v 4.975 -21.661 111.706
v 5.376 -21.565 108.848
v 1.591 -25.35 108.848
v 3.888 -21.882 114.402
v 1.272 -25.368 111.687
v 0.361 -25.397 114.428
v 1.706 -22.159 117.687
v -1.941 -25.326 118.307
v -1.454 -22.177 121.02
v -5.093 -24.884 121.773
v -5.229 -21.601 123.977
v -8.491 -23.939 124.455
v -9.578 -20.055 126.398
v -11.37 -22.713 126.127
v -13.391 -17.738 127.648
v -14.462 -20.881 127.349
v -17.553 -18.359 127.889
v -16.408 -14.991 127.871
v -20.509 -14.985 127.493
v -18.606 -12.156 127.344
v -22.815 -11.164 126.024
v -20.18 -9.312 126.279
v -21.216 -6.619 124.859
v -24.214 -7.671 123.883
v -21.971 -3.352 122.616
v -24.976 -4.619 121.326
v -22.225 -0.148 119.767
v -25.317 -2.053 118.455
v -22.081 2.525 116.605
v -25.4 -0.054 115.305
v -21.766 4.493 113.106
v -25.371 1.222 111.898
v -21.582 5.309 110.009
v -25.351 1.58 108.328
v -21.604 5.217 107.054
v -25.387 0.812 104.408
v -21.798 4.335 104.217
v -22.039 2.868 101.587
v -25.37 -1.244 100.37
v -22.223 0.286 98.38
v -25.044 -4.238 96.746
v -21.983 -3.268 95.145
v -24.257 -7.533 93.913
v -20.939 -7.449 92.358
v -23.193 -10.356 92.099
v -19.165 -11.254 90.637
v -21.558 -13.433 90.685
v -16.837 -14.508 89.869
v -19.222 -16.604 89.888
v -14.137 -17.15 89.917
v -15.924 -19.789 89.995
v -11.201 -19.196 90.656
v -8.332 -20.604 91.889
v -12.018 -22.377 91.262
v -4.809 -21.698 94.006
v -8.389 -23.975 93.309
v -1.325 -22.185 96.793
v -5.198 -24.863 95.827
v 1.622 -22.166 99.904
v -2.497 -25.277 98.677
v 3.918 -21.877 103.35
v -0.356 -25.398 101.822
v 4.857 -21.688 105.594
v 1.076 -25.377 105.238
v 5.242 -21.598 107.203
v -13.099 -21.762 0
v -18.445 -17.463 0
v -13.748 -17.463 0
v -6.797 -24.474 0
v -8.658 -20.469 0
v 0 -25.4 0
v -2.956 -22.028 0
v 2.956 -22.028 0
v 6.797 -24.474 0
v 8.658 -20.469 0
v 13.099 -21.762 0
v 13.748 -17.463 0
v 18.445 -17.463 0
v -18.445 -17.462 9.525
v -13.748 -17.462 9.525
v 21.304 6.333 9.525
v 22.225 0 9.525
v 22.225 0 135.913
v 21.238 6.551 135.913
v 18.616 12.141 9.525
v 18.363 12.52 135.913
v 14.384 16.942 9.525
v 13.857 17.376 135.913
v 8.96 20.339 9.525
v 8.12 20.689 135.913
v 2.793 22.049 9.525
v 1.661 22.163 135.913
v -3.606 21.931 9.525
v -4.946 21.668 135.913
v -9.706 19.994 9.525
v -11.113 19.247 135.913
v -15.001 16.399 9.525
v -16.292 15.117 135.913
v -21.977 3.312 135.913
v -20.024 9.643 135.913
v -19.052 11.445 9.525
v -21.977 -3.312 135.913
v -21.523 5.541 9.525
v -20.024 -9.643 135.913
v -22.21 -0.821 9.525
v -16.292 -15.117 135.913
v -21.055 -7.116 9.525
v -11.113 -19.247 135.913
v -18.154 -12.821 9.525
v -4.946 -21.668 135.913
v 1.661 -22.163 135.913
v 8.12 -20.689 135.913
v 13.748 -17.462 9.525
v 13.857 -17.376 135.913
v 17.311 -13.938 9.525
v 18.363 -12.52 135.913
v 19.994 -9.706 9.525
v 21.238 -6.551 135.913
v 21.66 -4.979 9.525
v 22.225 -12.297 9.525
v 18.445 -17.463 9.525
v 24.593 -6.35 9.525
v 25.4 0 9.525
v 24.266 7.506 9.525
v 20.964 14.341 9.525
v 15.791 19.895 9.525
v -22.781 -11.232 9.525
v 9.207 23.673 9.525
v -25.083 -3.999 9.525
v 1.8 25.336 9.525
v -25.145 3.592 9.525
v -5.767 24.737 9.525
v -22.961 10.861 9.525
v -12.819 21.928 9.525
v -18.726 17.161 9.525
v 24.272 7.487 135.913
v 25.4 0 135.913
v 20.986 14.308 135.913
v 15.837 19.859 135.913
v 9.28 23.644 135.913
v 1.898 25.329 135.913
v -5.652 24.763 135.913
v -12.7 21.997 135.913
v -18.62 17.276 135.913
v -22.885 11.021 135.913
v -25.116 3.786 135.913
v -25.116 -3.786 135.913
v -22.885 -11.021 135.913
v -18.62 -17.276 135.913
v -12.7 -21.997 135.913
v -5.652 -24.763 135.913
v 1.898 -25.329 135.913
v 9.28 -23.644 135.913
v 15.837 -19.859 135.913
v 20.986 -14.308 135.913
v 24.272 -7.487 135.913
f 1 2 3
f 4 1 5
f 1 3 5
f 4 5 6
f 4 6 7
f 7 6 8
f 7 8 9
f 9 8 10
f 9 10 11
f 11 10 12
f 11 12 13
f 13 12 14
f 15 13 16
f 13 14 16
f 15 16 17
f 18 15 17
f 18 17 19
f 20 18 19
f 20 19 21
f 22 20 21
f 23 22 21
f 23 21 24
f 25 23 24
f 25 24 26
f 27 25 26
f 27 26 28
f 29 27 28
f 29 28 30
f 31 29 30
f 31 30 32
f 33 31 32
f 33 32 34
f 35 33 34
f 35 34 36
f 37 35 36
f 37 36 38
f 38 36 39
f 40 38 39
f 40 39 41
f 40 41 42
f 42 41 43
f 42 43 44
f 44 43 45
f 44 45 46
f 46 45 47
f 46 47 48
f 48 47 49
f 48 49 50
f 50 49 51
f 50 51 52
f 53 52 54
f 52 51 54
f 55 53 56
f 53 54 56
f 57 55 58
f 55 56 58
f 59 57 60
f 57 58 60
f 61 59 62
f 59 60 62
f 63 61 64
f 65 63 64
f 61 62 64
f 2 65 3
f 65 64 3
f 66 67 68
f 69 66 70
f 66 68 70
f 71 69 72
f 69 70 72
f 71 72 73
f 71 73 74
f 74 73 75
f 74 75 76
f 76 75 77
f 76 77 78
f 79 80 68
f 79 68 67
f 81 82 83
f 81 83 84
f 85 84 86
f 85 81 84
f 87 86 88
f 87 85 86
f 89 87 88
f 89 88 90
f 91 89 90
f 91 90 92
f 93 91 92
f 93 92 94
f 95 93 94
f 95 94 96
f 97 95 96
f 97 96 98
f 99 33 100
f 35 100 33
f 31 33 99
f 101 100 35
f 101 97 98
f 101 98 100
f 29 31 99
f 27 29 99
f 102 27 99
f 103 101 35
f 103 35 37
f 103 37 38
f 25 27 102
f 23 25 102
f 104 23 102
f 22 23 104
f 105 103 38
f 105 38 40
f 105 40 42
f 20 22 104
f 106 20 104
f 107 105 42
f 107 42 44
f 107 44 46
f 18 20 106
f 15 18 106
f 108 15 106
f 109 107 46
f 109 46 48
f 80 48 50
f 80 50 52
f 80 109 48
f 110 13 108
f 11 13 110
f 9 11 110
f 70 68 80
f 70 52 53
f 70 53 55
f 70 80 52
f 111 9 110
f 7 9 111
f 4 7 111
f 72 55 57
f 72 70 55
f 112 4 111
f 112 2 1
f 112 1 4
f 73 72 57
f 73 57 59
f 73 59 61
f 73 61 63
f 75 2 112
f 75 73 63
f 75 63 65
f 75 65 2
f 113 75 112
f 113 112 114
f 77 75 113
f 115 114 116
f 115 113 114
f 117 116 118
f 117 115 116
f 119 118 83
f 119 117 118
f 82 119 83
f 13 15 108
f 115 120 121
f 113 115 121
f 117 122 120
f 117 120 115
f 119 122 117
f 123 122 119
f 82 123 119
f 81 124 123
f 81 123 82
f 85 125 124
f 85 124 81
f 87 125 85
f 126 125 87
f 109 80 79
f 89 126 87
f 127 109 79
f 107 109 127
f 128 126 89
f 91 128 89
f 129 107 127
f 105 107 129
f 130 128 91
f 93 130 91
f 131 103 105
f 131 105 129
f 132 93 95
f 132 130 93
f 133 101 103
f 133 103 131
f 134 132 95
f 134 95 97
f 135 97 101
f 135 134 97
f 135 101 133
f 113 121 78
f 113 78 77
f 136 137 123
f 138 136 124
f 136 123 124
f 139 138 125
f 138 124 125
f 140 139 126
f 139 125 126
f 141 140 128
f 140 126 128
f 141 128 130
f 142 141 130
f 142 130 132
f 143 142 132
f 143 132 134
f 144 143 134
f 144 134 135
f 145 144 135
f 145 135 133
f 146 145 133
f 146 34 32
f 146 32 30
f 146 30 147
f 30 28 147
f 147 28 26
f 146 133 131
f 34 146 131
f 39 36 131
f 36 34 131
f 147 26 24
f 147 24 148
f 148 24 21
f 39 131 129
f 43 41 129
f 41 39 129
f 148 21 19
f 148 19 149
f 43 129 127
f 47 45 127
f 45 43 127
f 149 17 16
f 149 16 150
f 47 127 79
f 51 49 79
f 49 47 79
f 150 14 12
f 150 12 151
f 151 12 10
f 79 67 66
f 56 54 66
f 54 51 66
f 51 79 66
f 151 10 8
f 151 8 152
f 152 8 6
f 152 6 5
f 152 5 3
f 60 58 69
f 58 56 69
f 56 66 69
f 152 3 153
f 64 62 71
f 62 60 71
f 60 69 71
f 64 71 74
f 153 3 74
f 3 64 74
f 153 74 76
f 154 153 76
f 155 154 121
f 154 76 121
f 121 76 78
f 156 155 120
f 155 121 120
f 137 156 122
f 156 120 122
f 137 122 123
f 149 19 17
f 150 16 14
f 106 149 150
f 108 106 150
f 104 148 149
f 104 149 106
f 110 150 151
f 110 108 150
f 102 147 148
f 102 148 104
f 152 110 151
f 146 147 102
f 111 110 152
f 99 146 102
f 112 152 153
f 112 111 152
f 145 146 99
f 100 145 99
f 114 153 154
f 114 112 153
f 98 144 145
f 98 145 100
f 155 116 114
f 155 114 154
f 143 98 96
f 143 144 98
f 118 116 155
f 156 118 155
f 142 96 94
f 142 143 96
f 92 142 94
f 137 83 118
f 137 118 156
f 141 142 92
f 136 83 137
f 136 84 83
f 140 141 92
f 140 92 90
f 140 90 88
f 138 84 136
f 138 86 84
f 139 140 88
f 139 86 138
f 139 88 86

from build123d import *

# Parameters (mm, degrees)
SKETCH1_R               = 25.4
SKETCH1_R_2             = 22.225
BOSS_EXTRUDE1_DEPTH     = 914.4
CUT_EXTRUDE1_START      = -152.4
SKETCH2_R               = 25.4
CUT_EXTRUDE1_DEPTH      = 763.70528356
CUT_EXTRUDE2_DEPTH      = 148.321368528
SKETCH4_W               = 50.8
SKETCH4_H               = 16.486891384
CUT_EXTRUDE3_DEPTH      = 163.639355631
CUT_EXTRUDE4_REACH      = 151.106
CUT_EXTRUDE4_END_RADIUS = 22.225
SKETCH5_R               = 19.05


with BuildPart() as part:
    # Sketch1 → Boss-Extrude1 (new body)
    with BuildSketch(Plane.XY):
        Circle(SKETCH1_R)
        Circle(SKETCH1_R_2, mode=Mode.SUBTRACT)
    extrude(amount=BOSS_EXTRUDE1_DEPTH)

    # Sketch2 → Cut-Extrude1 (cut, through all)
    with BuildSketch(Plane(origin=(0, 0, 0), x_dir=(-1, 0, 0), z_dir=(0, 0, -1)).offset(CUT_EXTRUDE1_START)):
        Circle(SKETCH2_R)
    extrude(amount=-CUT_EXTRUDE1_DEPTH, mode=Mode.SUBTRACT)

    # Sketch3 → Cut-Extrude2 (cut, through all)
    with BuildSketch(Plane(origin=(0, 0, 9.525), x_dir=(-1, 0, 0), z_dir=(0, 0, -1))):
        with BuildLine():
            Line((-18.445083186, -17.4625), (18.445083186, -17.4625))
            ThreePointArc((18.445083186, -17.4625), (0, 25.4), (-18.445083186, -17.4625))
        make_face()
    extrude(amount=CUT_EXTRUDE2_DEPTH, mode=Mode.SUBTRACT)

    # Sketch4 → Cut-Extrude3 (cut, through all)
    with BuildSketch(Plane(origin=(0, 25.4, 0), x_dir=(1, 0, 0), z_dir=(0, 1, 0))):
        with Locations((0, -144.156554308)):
            Rectangle(SKETCH4_W, SKETCH4_H)
    extrude(amount=-CUT_EXTRUDE3_DEPTH, mode=Mode.SUBTRACT)

    # Cut-Extrude4: up to this cylinder (the profile starts outside it)
    cut_extrude4_end = Plane(origin=(0, 0, 108.847618), z_dir=(0, 0, -1)) * Cylinder(CUT_EXTRUDE4_END_RADIUS, 347.662, mode=Mode.PRIVATE)
    # Sketch5 → Cut-Extrude4 (cut, up to the surface)
    with BuildSketch(Plane(origin=(-17.960512242, -17.960512242, 0), x_dir=(0, 0, -1), z_dir=(-0.7071067811865464, -0.7071067811865488, 0)), mode=Mode.PRIVATE) as cut_extrude4_sk1:
        with Locations(Location((-108.847617901, 0, 0), (0, 0, 90))):
            Circle(SKETCH5_R)
    cut_extrude4_tool1 = extrude(cut_extrude4_sk1.sketch, amount=-CUT_EXTRUDE4_REACH, mode=Mode.PRIVATE) - cut_extrude4_end
    add(cut_extrude4_tool1.solids().sort_by_distance((-17.960512, -17.960512, 108.847618))[0], mode=Mode.SUBTRACT)


solid = part.part
